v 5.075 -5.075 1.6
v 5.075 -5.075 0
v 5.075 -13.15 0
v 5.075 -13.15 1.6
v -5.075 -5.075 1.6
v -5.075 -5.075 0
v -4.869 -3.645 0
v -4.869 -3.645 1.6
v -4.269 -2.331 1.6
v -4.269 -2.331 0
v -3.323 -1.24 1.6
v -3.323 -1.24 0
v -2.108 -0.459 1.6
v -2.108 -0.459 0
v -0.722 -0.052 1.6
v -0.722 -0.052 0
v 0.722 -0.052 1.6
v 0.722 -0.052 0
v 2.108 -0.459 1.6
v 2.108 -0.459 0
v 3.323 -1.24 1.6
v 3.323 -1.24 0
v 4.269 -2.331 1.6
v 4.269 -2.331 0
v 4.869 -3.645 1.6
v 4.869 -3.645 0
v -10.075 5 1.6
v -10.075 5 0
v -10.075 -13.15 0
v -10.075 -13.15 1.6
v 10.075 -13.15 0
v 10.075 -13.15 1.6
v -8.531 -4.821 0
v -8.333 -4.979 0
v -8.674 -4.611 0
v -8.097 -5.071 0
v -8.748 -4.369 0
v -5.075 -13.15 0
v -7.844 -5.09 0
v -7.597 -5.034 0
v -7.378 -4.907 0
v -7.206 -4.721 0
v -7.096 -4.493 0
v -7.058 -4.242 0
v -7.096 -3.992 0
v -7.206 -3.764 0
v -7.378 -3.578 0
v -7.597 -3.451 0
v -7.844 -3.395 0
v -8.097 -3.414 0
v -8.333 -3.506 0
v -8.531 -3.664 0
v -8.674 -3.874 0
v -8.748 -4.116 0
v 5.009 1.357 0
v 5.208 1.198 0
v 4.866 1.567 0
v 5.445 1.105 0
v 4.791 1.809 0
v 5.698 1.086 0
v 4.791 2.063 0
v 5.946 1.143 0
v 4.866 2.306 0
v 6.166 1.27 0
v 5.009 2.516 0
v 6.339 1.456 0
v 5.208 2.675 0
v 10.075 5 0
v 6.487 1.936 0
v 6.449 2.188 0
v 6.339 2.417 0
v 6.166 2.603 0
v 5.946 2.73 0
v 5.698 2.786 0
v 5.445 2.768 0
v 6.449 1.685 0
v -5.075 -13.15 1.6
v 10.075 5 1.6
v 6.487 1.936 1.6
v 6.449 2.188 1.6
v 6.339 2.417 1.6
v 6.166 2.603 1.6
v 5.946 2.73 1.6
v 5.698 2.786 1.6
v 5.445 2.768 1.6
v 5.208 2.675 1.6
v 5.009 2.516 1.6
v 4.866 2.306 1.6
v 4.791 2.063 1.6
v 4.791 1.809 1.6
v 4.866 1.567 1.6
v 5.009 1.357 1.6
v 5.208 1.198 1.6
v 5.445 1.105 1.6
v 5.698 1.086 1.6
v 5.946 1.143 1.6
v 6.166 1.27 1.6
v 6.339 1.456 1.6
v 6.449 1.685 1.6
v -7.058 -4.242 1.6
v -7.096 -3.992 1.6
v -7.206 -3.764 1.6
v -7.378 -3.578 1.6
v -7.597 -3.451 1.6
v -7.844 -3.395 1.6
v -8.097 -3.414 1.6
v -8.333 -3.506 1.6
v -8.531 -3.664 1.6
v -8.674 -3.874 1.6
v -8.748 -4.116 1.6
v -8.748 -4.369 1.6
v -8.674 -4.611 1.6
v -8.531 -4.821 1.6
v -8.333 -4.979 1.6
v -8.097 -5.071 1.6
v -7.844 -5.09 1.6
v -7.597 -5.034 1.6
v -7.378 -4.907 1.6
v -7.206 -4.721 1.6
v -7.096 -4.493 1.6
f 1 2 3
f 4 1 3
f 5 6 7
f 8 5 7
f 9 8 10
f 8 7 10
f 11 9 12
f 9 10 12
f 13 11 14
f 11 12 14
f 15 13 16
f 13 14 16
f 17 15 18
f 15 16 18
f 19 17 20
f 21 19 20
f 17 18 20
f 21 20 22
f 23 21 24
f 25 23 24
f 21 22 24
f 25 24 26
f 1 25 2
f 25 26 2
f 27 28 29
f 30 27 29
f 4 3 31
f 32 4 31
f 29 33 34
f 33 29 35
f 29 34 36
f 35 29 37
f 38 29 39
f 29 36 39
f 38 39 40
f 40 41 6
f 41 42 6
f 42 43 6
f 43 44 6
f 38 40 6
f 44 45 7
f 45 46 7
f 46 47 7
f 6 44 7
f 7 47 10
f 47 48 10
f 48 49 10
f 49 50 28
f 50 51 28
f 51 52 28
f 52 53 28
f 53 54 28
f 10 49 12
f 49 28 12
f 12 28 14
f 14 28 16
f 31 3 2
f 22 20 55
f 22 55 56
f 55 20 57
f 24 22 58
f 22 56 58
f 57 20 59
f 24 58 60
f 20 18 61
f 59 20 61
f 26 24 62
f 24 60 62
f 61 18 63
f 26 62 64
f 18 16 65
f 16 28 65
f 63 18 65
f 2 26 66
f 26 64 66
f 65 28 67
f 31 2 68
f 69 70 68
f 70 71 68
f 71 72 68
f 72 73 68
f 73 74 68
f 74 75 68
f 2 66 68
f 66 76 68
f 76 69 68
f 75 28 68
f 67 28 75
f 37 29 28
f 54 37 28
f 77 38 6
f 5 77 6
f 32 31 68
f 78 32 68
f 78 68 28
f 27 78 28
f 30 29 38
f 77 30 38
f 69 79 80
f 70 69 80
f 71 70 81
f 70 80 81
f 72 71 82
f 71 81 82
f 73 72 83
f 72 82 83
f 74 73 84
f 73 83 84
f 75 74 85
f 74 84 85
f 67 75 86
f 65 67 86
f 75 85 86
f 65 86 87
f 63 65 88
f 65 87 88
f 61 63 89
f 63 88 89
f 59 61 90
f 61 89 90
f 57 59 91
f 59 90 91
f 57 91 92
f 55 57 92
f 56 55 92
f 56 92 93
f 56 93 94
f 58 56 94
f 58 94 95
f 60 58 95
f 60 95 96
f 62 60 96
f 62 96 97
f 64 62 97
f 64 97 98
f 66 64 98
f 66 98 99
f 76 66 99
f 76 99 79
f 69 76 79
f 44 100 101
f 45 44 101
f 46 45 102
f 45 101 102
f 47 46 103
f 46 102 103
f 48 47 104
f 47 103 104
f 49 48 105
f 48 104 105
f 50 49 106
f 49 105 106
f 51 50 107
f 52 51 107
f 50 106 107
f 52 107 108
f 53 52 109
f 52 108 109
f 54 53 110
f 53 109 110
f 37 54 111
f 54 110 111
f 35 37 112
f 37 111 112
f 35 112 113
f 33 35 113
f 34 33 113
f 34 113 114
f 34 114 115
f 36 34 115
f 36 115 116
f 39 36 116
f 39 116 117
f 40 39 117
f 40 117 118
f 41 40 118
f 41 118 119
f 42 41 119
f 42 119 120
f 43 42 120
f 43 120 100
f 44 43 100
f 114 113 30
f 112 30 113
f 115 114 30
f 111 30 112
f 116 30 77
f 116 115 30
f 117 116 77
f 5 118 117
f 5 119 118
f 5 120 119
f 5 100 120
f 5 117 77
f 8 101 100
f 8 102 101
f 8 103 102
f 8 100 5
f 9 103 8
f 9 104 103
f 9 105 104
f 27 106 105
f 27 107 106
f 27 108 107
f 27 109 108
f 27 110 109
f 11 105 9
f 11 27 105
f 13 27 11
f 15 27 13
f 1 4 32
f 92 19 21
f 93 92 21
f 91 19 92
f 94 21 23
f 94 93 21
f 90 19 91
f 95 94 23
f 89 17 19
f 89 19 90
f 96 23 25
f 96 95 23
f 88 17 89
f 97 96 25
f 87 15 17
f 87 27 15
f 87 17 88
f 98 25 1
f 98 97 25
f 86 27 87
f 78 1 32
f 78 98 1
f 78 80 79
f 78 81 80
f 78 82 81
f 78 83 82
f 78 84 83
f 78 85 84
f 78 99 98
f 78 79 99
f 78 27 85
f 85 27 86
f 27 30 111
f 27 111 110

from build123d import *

# Parameters (mm, degrees)
BOSS_EXTRUDE1_DEPTH = 1.6
SKETCH2_R           = 0.852453889
SKETCH2_R_2         = 0.85
CUT_EXTRUDE1_DEPTH  = 3


with BuildPart() as part:
    # Sketch1 → Boss-Extrude1 (new body)
    with BuildSketch(Plane.XY):
        with BuildLine():
            Line((10.075, 5), (-10.075, 5))
            Line((-10.075, 5), (-10.075, -13.15))
            Line((-10.075, -13.15), (-5.075, -13.15))
            Line((-5.075, -13.15), (-5.075, -5.075))
            ThreePointArc((-5.075, -5.075), (0, 0), (5.075, -5.075))
            Line((5.075, -5.075), (5.075, -13.15))
            Line((5.075, -13.15), (10.075, -13.15))
            Line((10.075, -13.15), (10.075, 5))
        make_face()
    extrude(amount=BOSS_EXTRUDE1_DEPTH)

    # Sketch2 → Cut-Extrude1 (cut)
    with BuildSketch(Plane.XY.offset(1.6)):
        with Locations((5.634338394, 1.936419455)):
            Circle(SKETCH2_R)
        with Locations((-7.907828008, -4.242394056)):
            Circle(SKETCH2_R_2)
    extrude(amount=-CUT_EXTRUDE1_DEPTH, mode=Mode.SUBTRACT)


solid = part.part
